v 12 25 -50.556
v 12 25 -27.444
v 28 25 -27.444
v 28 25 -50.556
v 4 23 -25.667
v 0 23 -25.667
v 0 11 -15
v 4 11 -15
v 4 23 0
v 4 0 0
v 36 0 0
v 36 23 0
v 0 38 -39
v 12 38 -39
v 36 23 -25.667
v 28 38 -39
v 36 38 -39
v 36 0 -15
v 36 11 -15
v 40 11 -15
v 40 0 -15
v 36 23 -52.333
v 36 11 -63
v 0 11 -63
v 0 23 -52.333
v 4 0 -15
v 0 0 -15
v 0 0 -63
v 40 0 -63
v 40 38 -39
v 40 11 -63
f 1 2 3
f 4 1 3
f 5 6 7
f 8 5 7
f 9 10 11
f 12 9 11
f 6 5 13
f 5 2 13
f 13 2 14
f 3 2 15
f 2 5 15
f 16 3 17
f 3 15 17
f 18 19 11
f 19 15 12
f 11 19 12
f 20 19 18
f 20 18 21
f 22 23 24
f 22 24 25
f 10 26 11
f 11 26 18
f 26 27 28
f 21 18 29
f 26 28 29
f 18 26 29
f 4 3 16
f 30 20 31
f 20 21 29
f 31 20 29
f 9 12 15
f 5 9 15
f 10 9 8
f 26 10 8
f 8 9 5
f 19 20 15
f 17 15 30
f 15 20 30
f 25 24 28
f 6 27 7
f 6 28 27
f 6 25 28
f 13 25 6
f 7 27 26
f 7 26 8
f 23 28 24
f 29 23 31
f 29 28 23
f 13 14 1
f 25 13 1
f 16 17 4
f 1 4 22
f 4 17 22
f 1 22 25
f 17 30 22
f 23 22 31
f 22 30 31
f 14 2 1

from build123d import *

# Parameters (mm, degrees)
CROQUIS1_W              = 40
CROQUIS1_H              = 63
SALIENTE_EXTRUIR1_DEPTH = 38
CROQUIS2_W              = 4
CROQUIS2_H              = 15
CORTAR_EXTRUIR1_DEPTH   = 38
CORTAR_EXTRUIR2_DEPTH   = 4
CORTAR_EXTRUIR14_DEPTH  = 60
CORTAR_EXTRUIR15_DEPTH  = 40
CROQUIS20_W             = 25.666666667
CROQUIS20_H             = 15
CROQUIS20_W_2           = 10.666666667
CORTAR_EXTRUIR16_DEPTH  = 40
CROQUIS22_W             = 16
CROQUIS22_H             = 13
CORTAR_EXTRUIR17_DEPTH  = 72
CORTAR_EXTRUIR19_DEPTH  = 40
SALIENTE_EXTRUIR2_DEPTH = 36
CORTAR_EXTRUIR20_DEPTH  = 4


with BuildPart() as part:
    # Croquis1 → Saliente-Extruir1 (new body)
    with BuildSketch(Plane(origin=(0, 0, 0), x_dir=(1, 0, 0), z_dir=(0, 1, 0))):
        with Locations((20, 31.5)):
            Rectangle(CROQUIS1_W, CROQUIS1_H)
    extrude(amount=SALIENTE_EXTRUIR1_DEPTH)

    # Croquis2 → Cortar-Extruir1 (cut)
    with BuildSketch(Plane(origin=(0, 38, 0), x_dir=(1, 0, 0), z_dir=(0, 1, 0))):
        with Locations((2, 7.5)):
            Rectangle(CROQUIS2_W, CROQUIS2_H)
        with Locations((38, 7.5)):
            Rectangle(CROQUIS2_W, CROQUIS2_H)
    extrude(amount=-CORTAR_EXTRUIR1_DEPTH, mode=Mode.SUBTRACT)

    # Croquis5 → Cortar-Extruir2 (cut)
    with BuildSketch(Plane(origin=(40, 0, 0), x_dir=(0, 0, -1), z_dir=(1, 0, 0))):
        Polygon((15, 38), (15, 11), (39, 38), align=None)
        Polygon((63, 38), (39, 38), (63, 11), align=None)
    extrude(amount=-CORTAR_EXTRUIR2_DEPTH, mode=Mode.SUBTRACT)

    # Croquis11 → Cortar-Extruir14 (cut)
    with BuildSketch(Plane(origin=(40, 0, 0), x_dir=(0, 0, -1), z_dir=(1, 0, 0))):
        Polygon((39, 38), (52.333333333, 23), (52.333333333, 38), align=None)
    extrude(amount=-CORTAR_EXTRUIR14_DEPTH, mode=Mode.SUBTRACT)

    # Croquis19 → Cortar-Extruir15 (cut)
    with BuildSketch(Plane(origin=(40, 0, 0), x_dir=(0, 0, -1), z_dir=(1, 0, 0))):
        Polygon((25.666666667, 23), (39, 38), (25.666666667, 38), align=None)
    extrude(amount=-CORTAR_EXTRUIR15_DEPTH, mode=Mode.SUBTRACT)

    # Croquis20 → Cortar-Extruir16 (cut)
    with BuildSketch(Plane(origin=(40, 0, 0), x_dir=(0, 0, -1), z_dir=(1, 0, 0))):
        with Locations((12.833333334, 30.5)):
            Rectangle(CROQUIS20_W, CROQUIS20_H)
        with Locations((57.666666667, 30.5)):
            Rectangle(CROQUIS20_W_2, CROQUIS20_H)
    extrude(amount=-CORTAR_EXTRUIR16_DEPTH, mode=Mode.SUBTRACT)

    # Croquis22 → Cortar-Extruir17 (cut)
    with BuildSketch(Plane.XY):
        with Locations((20, 31.5)):
            Rectangle(CROQUIS22_W, CROQUIS22_H)
    extrude(amount=-CORTAR_EXTRUIR17_DEPTH, mode=Mode.SUBTRACT)

    # Croquis23 → Cortar-Extruir19 (cut)
    with BuildSketch(Plane.ZY):
        Polygon((-63, 23), (-63, 11), (-52.333333333, 23), align=None)
        Polygon((-25.666666667, 23), (-15, 11), (-15, 23), align=None)
    extrude(amount=-CORTAR_EXTRUIR19_DEPTH, mode=Mode.SUBTRACT)

    # Croquis24 → Saliente-Extruir2 (add)
    with BuildSketch(Plane.ZY):
        Polygon((-15, 11), (-15, 23), (-25.666666667, 23), align=None)
    extrude(amount=-SALIENTE_EXTRUIR2_DEPTH)

    # Croquis26 → Cortar-Extruir20 (cut)
    with BuildSketch(Plane.ZY):
        Polygon((-15, 23), (-25.666666667, 23), (-15, 11), align=None)
    extrude(amount=-CORTAR_EXTRUIR20_DEPTH, mode=Mode.SUBTRACT)


solid = part.part
